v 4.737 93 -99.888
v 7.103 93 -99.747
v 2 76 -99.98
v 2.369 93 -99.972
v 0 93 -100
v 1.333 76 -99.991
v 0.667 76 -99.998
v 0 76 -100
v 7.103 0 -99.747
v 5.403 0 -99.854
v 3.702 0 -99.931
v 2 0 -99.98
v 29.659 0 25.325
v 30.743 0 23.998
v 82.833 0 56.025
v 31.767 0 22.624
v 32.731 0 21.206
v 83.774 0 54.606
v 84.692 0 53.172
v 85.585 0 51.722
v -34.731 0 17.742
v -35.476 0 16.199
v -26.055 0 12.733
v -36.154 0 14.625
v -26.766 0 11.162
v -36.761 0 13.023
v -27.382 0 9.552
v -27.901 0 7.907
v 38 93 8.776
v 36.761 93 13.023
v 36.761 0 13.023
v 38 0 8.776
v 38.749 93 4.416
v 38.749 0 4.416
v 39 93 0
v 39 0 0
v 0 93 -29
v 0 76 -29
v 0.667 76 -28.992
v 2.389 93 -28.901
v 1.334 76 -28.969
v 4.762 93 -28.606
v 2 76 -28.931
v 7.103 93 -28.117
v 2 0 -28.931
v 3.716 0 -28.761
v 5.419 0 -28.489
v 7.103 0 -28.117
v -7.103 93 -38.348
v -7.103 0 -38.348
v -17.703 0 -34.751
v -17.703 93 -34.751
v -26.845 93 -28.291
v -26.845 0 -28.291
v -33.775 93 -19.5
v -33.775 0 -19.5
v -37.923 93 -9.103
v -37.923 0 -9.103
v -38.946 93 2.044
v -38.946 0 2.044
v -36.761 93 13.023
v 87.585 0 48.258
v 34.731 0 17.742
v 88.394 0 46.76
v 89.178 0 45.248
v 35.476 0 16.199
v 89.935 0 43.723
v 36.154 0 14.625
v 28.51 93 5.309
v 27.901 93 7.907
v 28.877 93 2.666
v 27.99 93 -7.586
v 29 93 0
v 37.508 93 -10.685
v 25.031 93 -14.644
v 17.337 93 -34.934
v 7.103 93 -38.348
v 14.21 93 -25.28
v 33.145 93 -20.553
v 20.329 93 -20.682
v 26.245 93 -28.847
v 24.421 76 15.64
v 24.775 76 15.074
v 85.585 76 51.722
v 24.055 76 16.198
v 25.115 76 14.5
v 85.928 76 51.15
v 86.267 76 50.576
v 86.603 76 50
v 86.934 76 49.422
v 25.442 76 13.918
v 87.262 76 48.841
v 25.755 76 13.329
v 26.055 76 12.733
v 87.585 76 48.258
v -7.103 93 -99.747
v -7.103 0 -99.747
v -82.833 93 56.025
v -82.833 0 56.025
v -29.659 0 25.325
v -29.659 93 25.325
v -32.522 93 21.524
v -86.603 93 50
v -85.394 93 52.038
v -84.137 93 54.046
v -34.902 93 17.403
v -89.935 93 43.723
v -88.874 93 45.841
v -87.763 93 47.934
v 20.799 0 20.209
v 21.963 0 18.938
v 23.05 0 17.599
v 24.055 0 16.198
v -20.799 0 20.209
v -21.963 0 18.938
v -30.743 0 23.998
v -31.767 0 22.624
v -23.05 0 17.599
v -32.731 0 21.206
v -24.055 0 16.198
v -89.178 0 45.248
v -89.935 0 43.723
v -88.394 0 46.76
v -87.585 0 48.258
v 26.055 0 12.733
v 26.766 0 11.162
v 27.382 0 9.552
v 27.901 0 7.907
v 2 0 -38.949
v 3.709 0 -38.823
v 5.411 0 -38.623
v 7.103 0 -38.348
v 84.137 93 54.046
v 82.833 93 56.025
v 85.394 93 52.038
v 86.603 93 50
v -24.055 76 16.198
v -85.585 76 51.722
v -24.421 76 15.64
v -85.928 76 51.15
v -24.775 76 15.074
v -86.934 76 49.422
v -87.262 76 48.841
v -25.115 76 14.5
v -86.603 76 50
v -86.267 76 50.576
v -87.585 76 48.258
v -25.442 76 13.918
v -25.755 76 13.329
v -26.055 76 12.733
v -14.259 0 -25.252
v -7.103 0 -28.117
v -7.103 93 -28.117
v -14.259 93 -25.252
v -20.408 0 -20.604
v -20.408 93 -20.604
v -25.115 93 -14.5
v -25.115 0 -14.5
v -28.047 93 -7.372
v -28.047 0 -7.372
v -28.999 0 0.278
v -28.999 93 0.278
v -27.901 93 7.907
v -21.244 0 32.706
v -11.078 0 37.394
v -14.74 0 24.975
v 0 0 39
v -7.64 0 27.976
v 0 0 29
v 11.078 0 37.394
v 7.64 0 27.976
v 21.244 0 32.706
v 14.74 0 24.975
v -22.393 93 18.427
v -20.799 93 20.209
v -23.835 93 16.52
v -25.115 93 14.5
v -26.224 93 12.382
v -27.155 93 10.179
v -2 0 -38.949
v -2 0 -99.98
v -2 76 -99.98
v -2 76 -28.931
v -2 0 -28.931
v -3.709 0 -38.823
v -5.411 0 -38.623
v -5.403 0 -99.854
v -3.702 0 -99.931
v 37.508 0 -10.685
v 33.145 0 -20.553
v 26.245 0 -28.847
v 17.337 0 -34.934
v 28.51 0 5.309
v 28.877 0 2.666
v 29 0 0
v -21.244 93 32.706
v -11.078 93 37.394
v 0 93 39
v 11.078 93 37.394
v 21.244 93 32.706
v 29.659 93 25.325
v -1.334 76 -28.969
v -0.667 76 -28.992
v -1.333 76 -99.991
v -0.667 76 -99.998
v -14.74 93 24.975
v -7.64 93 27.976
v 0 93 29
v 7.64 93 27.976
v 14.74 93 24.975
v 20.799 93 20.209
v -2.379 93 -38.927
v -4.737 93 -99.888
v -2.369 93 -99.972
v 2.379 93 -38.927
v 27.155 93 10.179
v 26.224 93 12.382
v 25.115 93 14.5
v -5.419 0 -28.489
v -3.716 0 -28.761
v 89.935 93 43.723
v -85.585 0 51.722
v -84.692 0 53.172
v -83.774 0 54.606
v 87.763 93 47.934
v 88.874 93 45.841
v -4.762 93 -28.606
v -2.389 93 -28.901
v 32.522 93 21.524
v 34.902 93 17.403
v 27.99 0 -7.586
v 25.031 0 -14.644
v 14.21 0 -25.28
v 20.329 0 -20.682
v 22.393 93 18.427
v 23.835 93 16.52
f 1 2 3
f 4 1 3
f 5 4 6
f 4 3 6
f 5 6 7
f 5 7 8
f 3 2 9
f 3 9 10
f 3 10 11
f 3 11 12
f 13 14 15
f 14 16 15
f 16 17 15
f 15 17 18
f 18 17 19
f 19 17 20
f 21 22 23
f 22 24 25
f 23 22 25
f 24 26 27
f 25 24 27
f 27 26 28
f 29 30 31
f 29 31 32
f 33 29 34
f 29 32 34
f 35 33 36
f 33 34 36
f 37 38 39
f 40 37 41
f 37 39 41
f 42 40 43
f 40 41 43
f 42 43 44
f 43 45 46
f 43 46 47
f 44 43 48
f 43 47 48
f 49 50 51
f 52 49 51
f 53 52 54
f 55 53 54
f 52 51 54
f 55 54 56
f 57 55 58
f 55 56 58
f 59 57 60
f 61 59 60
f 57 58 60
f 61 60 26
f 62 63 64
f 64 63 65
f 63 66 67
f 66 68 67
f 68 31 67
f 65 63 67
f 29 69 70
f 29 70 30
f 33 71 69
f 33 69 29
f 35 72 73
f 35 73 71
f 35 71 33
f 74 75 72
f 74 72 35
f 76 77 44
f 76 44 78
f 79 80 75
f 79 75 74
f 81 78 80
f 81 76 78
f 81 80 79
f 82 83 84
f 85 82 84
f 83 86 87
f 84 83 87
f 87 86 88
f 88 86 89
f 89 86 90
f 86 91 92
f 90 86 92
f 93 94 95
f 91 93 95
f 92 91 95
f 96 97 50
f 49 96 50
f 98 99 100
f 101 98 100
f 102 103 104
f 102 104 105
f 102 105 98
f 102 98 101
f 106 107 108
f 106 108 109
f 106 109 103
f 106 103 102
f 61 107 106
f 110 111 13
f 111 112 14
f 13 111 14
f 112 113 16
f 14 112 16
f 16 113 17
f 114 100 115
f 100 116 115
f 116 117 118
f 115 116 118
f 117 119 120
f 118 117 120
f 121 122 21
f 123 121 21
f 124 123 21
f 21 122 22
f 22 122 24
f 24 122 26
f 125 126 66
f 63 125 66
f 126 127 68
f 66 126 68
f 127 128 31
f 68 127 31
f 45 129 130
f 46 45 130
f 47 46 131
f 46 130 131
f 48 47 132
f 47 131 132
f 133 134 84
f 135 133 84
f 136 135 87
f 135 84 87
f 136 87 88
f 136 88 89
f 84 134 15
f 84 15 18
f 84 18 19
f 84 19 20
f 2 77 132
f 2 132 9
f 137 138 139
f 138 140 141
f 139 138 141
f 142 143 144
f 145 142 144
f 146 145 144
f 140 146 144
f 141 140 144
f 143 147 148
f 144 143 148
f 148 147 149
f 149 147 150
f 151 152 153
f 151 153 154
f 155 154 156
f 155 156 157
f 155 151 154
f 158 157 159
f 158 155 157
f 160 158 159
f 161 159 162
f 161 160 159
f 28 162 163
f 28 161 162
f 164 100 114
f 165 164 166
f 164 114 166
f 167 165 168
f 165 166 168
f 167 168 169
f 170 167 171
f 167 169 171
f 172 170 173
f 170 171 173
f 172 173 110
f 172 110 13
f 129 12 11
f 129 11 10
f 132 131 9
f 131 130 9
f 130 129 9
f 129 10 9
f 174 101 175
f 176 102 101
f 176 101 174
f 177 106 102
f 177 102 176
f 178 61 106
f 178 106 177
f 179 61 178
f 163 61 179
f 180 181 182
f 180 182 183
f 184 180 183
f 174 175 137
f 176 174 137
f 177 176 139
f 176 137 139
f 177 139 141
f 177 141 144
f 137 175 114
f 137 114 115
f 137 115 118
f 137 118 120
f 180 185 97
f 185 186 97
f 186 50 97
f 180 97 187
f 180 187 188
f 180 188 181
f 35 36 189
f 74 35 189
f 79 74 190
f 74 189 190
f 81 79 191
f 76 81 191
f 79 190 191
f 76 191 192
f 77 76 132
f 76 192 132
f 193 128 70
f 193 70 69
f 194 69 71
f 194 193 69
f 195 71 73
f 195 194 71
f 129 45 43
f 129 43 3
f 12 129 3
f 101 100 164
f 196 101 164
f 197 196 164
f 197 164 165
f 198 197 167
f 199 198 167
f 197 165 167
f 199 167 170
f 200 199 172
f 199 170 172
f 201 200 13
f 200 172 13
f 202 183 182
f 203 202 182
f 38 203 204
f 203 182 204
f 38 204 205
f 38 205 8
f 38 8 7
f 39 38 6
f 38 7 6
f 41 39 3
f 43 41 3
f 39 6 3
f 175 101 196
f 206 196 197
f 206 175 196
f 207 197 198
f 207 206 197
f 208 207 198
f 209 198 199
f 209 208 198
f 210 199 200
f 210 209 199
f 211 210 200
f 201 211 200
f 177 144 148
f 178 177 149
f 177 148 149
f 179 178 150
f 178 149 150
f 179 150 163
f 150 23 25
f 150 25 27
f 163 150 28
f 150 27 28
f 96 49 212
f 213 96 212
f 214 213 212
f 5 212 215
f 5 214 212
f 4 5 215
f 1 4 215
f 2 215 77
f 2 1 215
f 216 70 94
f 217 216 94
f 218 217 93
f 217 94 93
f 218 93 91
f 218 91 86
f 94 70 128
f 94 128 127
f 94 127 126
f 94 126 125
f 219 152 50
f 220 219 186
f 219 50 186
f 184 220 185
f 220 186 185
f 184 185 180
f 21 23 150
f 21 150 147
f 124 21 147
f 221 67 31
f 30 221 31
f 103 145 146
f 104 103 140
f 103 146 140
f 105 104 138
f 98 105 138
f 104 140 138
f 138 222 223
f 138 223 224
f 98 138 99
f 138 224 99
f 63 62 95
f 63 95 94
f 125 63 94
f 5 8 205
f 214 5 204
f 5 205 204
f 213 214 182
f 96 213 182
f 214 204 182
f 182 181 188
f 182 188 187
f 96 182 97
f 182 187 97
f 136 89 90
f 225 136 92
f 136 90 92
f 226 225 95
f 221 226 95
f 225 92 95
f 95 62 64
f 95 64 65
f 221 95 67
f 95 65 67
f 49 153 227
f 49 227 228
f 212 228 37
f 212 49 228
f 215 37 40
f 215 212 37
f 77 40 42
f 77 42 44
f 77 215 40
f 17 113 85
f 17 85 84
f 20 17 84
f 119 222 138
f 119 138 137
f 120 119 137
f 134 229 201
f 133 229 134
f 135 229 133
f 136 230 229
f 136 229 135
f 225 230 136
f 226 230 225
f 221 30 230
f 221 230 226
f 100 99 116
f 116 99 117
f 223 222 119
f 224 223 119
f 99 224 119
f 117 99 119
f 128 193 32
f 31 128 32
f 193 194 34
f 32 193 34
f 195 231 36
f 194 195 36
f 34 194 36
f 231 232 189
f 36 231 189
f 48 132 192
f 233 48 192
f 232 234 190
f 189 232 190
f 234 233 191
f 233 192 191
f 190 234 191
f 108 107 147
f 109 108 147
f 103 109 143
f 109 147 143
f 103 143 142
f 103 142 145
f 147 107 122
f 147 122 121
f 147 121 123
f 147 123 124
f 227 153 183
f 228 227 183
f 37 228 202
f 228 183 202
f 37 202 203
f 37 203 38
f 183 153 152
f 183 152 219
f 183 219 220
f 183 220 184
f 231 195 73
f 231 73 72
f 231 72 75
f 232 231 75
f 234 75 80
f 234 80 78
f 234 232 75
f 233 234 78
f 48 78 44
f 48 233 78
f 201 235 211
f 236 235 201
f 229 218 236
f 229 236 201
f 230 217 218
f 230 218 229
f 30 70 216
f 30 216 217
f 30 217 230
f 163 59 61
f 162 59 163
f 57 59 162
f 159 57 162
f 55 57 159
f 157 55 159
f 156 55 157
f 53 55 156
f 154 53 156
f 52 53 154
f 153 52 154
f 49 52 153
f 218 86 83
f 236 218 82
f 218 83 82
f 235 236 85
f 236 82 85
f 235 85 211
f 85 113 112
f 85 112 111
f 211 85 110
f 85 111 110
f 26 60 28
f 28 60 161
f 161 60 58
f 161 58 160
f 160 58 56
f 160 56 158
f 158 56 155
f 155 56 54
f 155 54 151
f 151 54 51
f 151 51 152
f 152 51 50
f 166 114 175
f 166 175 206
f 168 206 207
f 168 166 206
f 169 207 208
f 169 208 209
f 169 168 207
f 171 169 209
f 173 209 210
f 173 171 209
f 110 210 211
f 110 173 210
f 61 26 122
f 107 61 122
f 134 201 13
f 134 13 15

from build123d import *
from build123d.topology import SkipClean

# Parameters (mm, degrees)
BOSS_EXTRUDE1_DEPTH     = 93
SKETCH1_4_R             = 39
SKETCH1_4_R_2           = 29
EXTRUDE_THIN1_DEPTH     = 93
CUT_EXTRUDE_THIN1_DEPTH = 76


# Read off the part's stored shape, not the designer's step: Cut-Extrude-Thin1
with BuildPart() as part:
    # Sketch1 → Boss-Extrude1 (new body)
    with BuildSketch(Plane(origin=(0, 0, 0), x_dir=(1, 0, 0), z_dir=(0, 1, 0))):
        with BuildLine():
            Line((-86.602540378, -50), (-25.11473671, -14.5))
            ThreePointArc((-25.11473671, -14.5), (-26.712107385, -11.289965415), (-27.901144427, -7.907347195))
            Line((-27.901144427, -7.907347195), (-89.935126387, -43.722683378))
            ThreePointArc((-89.935126387, -43.722683378), (-88.324617875, -46.890957308), (-86.602540378, -50))
        make_face()
        with BuildLine():
            ThreePointArc((-20.798535761, -20.209426271), (-23.133450549, -17.488380876), (-25.11473671, -14.5))
            Line((-25.11473671, -14.5), (-86.602540378, -50))
            ThreePointArc((-86.602540378, -50), (-84.771069174, -53.045884205), (-82.83251772, -56.024762455))
            Line((-82.83251772, -56.024762455), (-20.798535761, -20.209426271))
        make_face()
        with BuildLine():
            ThreePointArc((27.901144427, -7.907347195), (26.712107385, -11.289965415), (25.11473671, -14.5))
            Line((25.11473671, -14.5), (86.602540378, -50))
            ThreePointArc((86.602540378, -50), (88.324617875, -46.890957308), (89.935126387, -43.722683378))
            Line((89.935126387, -43.722683378), (27.901144427, -7.907347195))
        make_face()
        with BuildLine():
            Line((86.602540378, -50), (25.11473671, -14.5))
            ThreePointArc((25.11473671, -14.5), (23.133450549, -17.488380876), (20.798535761, -20.209426271))
            Line((20.798535761, -20.209426271), (82.83251772, -56.024762455))
            ThreePointArc((82.83251772, -56.024762455), (84.771069174, -53.045884205), (86.602540378, -50))
        make_face()
        with BuildLine():
            ThreePointArc((-7.102608667, 28.116773466), (-3.578656835, 28.778346291), (0, 29))
            Line((0, 29), (0, 100))
            ThreePointArc((0, 100), (-3.553548701, 99.936841513), (-7.102608667, 99.747445833))
            Line((-7.102608667, 99.747445833), (-7.102608667, 28.116773466))
        make_face()
        with BuildLine():
            Line((0, 100), (0, 29))
            ThreePointArc((0, 29), (3.578656835, 28.778346291), (7.102608667, 28.116773466))
            Line((7.102608667, 28.116773466), (7.102608667, 99.747445833))
            ThreePointArc((7.102608667, 99.747445833), (3.553548701, 99.936841513), (0, 100))
        make_face()
    extrude(amount=BOSS_EXTRUDE1_DEPTH)

    # Sketch1<4> → Extrude-Thin1 (add)
    with SkipClean():  # the faces are left unmerged after this step: merging them gives an invalid solid
        with BuildSketch(Plane(origin=(0, 0, 0), x_dir=(1, 0, 0), z_dir=(0, 1, 0))):
            Circle(SKETCH1_4_R)
            Circle(SKETCH1_4_R_2, mode=Mode.SUBTRACT)
        extrude(amount=EXTRUDE_THIN1_DEPTH)

    # Cut-Extrude-Thin1 outline → Cut-Extrude-Thin1 (cut)
    with SkipClean():  # the faces are left unmerged after this step: merging them gives an invalid solid
        with BuildSketch(Plane(origin=(0, 0, 0), x_dir=(1, 0, 0), z_dir=(0, 1, 0))):
            with BuildLine():
                Line((2, 28.930952283), (2, 99.979998))
                ThreePointArc((2, 99.979998), (0, 100), (-2, 99.979998))
                Line((-2, 99.979998), (-2, 28.930952283))
                ThreePointArc((-2, 28.930952283), (0, 29), (2, 28.930952283))
            make_face()
            with BuildLine():
                Line((87.585218138, -48.257948192), (26.054939633, -12.733425334))
                ThreePointArc((26.054939633, -12.733425334), (25.11473671, -14.5), (24.054939633, -16.197526949))
                Line((24.054939633, -16.197526949), (85.585218138, -51.722049807))
                ThreePointArc((85.585218138, -51.722049807), (86.602540378, -50), (87.585218138, -48.257948192))
            make_face()
            with BuildLine():
                ThreePointArc((-24.054939633, -16.197526949), (-25.11473671, -14.5), (-26.054939633, -12.733425334))
                Line((-26.054939633, -12.733425334), (-87.585218138, -48.257948192))
                ThreePointArc((-87.585218138, -48.257948192), (-86.602540378, -50), (-85.585218138, -51.722049807))
                Line((-85.585218138, -51.722049807), (-24.054939633, -16.197526949))
            make_face()
        extrude(amount=CUT_EXTRUDE_THIN1_DEPTH, mode=Mode.SUBTRACT)


solid = part.part
